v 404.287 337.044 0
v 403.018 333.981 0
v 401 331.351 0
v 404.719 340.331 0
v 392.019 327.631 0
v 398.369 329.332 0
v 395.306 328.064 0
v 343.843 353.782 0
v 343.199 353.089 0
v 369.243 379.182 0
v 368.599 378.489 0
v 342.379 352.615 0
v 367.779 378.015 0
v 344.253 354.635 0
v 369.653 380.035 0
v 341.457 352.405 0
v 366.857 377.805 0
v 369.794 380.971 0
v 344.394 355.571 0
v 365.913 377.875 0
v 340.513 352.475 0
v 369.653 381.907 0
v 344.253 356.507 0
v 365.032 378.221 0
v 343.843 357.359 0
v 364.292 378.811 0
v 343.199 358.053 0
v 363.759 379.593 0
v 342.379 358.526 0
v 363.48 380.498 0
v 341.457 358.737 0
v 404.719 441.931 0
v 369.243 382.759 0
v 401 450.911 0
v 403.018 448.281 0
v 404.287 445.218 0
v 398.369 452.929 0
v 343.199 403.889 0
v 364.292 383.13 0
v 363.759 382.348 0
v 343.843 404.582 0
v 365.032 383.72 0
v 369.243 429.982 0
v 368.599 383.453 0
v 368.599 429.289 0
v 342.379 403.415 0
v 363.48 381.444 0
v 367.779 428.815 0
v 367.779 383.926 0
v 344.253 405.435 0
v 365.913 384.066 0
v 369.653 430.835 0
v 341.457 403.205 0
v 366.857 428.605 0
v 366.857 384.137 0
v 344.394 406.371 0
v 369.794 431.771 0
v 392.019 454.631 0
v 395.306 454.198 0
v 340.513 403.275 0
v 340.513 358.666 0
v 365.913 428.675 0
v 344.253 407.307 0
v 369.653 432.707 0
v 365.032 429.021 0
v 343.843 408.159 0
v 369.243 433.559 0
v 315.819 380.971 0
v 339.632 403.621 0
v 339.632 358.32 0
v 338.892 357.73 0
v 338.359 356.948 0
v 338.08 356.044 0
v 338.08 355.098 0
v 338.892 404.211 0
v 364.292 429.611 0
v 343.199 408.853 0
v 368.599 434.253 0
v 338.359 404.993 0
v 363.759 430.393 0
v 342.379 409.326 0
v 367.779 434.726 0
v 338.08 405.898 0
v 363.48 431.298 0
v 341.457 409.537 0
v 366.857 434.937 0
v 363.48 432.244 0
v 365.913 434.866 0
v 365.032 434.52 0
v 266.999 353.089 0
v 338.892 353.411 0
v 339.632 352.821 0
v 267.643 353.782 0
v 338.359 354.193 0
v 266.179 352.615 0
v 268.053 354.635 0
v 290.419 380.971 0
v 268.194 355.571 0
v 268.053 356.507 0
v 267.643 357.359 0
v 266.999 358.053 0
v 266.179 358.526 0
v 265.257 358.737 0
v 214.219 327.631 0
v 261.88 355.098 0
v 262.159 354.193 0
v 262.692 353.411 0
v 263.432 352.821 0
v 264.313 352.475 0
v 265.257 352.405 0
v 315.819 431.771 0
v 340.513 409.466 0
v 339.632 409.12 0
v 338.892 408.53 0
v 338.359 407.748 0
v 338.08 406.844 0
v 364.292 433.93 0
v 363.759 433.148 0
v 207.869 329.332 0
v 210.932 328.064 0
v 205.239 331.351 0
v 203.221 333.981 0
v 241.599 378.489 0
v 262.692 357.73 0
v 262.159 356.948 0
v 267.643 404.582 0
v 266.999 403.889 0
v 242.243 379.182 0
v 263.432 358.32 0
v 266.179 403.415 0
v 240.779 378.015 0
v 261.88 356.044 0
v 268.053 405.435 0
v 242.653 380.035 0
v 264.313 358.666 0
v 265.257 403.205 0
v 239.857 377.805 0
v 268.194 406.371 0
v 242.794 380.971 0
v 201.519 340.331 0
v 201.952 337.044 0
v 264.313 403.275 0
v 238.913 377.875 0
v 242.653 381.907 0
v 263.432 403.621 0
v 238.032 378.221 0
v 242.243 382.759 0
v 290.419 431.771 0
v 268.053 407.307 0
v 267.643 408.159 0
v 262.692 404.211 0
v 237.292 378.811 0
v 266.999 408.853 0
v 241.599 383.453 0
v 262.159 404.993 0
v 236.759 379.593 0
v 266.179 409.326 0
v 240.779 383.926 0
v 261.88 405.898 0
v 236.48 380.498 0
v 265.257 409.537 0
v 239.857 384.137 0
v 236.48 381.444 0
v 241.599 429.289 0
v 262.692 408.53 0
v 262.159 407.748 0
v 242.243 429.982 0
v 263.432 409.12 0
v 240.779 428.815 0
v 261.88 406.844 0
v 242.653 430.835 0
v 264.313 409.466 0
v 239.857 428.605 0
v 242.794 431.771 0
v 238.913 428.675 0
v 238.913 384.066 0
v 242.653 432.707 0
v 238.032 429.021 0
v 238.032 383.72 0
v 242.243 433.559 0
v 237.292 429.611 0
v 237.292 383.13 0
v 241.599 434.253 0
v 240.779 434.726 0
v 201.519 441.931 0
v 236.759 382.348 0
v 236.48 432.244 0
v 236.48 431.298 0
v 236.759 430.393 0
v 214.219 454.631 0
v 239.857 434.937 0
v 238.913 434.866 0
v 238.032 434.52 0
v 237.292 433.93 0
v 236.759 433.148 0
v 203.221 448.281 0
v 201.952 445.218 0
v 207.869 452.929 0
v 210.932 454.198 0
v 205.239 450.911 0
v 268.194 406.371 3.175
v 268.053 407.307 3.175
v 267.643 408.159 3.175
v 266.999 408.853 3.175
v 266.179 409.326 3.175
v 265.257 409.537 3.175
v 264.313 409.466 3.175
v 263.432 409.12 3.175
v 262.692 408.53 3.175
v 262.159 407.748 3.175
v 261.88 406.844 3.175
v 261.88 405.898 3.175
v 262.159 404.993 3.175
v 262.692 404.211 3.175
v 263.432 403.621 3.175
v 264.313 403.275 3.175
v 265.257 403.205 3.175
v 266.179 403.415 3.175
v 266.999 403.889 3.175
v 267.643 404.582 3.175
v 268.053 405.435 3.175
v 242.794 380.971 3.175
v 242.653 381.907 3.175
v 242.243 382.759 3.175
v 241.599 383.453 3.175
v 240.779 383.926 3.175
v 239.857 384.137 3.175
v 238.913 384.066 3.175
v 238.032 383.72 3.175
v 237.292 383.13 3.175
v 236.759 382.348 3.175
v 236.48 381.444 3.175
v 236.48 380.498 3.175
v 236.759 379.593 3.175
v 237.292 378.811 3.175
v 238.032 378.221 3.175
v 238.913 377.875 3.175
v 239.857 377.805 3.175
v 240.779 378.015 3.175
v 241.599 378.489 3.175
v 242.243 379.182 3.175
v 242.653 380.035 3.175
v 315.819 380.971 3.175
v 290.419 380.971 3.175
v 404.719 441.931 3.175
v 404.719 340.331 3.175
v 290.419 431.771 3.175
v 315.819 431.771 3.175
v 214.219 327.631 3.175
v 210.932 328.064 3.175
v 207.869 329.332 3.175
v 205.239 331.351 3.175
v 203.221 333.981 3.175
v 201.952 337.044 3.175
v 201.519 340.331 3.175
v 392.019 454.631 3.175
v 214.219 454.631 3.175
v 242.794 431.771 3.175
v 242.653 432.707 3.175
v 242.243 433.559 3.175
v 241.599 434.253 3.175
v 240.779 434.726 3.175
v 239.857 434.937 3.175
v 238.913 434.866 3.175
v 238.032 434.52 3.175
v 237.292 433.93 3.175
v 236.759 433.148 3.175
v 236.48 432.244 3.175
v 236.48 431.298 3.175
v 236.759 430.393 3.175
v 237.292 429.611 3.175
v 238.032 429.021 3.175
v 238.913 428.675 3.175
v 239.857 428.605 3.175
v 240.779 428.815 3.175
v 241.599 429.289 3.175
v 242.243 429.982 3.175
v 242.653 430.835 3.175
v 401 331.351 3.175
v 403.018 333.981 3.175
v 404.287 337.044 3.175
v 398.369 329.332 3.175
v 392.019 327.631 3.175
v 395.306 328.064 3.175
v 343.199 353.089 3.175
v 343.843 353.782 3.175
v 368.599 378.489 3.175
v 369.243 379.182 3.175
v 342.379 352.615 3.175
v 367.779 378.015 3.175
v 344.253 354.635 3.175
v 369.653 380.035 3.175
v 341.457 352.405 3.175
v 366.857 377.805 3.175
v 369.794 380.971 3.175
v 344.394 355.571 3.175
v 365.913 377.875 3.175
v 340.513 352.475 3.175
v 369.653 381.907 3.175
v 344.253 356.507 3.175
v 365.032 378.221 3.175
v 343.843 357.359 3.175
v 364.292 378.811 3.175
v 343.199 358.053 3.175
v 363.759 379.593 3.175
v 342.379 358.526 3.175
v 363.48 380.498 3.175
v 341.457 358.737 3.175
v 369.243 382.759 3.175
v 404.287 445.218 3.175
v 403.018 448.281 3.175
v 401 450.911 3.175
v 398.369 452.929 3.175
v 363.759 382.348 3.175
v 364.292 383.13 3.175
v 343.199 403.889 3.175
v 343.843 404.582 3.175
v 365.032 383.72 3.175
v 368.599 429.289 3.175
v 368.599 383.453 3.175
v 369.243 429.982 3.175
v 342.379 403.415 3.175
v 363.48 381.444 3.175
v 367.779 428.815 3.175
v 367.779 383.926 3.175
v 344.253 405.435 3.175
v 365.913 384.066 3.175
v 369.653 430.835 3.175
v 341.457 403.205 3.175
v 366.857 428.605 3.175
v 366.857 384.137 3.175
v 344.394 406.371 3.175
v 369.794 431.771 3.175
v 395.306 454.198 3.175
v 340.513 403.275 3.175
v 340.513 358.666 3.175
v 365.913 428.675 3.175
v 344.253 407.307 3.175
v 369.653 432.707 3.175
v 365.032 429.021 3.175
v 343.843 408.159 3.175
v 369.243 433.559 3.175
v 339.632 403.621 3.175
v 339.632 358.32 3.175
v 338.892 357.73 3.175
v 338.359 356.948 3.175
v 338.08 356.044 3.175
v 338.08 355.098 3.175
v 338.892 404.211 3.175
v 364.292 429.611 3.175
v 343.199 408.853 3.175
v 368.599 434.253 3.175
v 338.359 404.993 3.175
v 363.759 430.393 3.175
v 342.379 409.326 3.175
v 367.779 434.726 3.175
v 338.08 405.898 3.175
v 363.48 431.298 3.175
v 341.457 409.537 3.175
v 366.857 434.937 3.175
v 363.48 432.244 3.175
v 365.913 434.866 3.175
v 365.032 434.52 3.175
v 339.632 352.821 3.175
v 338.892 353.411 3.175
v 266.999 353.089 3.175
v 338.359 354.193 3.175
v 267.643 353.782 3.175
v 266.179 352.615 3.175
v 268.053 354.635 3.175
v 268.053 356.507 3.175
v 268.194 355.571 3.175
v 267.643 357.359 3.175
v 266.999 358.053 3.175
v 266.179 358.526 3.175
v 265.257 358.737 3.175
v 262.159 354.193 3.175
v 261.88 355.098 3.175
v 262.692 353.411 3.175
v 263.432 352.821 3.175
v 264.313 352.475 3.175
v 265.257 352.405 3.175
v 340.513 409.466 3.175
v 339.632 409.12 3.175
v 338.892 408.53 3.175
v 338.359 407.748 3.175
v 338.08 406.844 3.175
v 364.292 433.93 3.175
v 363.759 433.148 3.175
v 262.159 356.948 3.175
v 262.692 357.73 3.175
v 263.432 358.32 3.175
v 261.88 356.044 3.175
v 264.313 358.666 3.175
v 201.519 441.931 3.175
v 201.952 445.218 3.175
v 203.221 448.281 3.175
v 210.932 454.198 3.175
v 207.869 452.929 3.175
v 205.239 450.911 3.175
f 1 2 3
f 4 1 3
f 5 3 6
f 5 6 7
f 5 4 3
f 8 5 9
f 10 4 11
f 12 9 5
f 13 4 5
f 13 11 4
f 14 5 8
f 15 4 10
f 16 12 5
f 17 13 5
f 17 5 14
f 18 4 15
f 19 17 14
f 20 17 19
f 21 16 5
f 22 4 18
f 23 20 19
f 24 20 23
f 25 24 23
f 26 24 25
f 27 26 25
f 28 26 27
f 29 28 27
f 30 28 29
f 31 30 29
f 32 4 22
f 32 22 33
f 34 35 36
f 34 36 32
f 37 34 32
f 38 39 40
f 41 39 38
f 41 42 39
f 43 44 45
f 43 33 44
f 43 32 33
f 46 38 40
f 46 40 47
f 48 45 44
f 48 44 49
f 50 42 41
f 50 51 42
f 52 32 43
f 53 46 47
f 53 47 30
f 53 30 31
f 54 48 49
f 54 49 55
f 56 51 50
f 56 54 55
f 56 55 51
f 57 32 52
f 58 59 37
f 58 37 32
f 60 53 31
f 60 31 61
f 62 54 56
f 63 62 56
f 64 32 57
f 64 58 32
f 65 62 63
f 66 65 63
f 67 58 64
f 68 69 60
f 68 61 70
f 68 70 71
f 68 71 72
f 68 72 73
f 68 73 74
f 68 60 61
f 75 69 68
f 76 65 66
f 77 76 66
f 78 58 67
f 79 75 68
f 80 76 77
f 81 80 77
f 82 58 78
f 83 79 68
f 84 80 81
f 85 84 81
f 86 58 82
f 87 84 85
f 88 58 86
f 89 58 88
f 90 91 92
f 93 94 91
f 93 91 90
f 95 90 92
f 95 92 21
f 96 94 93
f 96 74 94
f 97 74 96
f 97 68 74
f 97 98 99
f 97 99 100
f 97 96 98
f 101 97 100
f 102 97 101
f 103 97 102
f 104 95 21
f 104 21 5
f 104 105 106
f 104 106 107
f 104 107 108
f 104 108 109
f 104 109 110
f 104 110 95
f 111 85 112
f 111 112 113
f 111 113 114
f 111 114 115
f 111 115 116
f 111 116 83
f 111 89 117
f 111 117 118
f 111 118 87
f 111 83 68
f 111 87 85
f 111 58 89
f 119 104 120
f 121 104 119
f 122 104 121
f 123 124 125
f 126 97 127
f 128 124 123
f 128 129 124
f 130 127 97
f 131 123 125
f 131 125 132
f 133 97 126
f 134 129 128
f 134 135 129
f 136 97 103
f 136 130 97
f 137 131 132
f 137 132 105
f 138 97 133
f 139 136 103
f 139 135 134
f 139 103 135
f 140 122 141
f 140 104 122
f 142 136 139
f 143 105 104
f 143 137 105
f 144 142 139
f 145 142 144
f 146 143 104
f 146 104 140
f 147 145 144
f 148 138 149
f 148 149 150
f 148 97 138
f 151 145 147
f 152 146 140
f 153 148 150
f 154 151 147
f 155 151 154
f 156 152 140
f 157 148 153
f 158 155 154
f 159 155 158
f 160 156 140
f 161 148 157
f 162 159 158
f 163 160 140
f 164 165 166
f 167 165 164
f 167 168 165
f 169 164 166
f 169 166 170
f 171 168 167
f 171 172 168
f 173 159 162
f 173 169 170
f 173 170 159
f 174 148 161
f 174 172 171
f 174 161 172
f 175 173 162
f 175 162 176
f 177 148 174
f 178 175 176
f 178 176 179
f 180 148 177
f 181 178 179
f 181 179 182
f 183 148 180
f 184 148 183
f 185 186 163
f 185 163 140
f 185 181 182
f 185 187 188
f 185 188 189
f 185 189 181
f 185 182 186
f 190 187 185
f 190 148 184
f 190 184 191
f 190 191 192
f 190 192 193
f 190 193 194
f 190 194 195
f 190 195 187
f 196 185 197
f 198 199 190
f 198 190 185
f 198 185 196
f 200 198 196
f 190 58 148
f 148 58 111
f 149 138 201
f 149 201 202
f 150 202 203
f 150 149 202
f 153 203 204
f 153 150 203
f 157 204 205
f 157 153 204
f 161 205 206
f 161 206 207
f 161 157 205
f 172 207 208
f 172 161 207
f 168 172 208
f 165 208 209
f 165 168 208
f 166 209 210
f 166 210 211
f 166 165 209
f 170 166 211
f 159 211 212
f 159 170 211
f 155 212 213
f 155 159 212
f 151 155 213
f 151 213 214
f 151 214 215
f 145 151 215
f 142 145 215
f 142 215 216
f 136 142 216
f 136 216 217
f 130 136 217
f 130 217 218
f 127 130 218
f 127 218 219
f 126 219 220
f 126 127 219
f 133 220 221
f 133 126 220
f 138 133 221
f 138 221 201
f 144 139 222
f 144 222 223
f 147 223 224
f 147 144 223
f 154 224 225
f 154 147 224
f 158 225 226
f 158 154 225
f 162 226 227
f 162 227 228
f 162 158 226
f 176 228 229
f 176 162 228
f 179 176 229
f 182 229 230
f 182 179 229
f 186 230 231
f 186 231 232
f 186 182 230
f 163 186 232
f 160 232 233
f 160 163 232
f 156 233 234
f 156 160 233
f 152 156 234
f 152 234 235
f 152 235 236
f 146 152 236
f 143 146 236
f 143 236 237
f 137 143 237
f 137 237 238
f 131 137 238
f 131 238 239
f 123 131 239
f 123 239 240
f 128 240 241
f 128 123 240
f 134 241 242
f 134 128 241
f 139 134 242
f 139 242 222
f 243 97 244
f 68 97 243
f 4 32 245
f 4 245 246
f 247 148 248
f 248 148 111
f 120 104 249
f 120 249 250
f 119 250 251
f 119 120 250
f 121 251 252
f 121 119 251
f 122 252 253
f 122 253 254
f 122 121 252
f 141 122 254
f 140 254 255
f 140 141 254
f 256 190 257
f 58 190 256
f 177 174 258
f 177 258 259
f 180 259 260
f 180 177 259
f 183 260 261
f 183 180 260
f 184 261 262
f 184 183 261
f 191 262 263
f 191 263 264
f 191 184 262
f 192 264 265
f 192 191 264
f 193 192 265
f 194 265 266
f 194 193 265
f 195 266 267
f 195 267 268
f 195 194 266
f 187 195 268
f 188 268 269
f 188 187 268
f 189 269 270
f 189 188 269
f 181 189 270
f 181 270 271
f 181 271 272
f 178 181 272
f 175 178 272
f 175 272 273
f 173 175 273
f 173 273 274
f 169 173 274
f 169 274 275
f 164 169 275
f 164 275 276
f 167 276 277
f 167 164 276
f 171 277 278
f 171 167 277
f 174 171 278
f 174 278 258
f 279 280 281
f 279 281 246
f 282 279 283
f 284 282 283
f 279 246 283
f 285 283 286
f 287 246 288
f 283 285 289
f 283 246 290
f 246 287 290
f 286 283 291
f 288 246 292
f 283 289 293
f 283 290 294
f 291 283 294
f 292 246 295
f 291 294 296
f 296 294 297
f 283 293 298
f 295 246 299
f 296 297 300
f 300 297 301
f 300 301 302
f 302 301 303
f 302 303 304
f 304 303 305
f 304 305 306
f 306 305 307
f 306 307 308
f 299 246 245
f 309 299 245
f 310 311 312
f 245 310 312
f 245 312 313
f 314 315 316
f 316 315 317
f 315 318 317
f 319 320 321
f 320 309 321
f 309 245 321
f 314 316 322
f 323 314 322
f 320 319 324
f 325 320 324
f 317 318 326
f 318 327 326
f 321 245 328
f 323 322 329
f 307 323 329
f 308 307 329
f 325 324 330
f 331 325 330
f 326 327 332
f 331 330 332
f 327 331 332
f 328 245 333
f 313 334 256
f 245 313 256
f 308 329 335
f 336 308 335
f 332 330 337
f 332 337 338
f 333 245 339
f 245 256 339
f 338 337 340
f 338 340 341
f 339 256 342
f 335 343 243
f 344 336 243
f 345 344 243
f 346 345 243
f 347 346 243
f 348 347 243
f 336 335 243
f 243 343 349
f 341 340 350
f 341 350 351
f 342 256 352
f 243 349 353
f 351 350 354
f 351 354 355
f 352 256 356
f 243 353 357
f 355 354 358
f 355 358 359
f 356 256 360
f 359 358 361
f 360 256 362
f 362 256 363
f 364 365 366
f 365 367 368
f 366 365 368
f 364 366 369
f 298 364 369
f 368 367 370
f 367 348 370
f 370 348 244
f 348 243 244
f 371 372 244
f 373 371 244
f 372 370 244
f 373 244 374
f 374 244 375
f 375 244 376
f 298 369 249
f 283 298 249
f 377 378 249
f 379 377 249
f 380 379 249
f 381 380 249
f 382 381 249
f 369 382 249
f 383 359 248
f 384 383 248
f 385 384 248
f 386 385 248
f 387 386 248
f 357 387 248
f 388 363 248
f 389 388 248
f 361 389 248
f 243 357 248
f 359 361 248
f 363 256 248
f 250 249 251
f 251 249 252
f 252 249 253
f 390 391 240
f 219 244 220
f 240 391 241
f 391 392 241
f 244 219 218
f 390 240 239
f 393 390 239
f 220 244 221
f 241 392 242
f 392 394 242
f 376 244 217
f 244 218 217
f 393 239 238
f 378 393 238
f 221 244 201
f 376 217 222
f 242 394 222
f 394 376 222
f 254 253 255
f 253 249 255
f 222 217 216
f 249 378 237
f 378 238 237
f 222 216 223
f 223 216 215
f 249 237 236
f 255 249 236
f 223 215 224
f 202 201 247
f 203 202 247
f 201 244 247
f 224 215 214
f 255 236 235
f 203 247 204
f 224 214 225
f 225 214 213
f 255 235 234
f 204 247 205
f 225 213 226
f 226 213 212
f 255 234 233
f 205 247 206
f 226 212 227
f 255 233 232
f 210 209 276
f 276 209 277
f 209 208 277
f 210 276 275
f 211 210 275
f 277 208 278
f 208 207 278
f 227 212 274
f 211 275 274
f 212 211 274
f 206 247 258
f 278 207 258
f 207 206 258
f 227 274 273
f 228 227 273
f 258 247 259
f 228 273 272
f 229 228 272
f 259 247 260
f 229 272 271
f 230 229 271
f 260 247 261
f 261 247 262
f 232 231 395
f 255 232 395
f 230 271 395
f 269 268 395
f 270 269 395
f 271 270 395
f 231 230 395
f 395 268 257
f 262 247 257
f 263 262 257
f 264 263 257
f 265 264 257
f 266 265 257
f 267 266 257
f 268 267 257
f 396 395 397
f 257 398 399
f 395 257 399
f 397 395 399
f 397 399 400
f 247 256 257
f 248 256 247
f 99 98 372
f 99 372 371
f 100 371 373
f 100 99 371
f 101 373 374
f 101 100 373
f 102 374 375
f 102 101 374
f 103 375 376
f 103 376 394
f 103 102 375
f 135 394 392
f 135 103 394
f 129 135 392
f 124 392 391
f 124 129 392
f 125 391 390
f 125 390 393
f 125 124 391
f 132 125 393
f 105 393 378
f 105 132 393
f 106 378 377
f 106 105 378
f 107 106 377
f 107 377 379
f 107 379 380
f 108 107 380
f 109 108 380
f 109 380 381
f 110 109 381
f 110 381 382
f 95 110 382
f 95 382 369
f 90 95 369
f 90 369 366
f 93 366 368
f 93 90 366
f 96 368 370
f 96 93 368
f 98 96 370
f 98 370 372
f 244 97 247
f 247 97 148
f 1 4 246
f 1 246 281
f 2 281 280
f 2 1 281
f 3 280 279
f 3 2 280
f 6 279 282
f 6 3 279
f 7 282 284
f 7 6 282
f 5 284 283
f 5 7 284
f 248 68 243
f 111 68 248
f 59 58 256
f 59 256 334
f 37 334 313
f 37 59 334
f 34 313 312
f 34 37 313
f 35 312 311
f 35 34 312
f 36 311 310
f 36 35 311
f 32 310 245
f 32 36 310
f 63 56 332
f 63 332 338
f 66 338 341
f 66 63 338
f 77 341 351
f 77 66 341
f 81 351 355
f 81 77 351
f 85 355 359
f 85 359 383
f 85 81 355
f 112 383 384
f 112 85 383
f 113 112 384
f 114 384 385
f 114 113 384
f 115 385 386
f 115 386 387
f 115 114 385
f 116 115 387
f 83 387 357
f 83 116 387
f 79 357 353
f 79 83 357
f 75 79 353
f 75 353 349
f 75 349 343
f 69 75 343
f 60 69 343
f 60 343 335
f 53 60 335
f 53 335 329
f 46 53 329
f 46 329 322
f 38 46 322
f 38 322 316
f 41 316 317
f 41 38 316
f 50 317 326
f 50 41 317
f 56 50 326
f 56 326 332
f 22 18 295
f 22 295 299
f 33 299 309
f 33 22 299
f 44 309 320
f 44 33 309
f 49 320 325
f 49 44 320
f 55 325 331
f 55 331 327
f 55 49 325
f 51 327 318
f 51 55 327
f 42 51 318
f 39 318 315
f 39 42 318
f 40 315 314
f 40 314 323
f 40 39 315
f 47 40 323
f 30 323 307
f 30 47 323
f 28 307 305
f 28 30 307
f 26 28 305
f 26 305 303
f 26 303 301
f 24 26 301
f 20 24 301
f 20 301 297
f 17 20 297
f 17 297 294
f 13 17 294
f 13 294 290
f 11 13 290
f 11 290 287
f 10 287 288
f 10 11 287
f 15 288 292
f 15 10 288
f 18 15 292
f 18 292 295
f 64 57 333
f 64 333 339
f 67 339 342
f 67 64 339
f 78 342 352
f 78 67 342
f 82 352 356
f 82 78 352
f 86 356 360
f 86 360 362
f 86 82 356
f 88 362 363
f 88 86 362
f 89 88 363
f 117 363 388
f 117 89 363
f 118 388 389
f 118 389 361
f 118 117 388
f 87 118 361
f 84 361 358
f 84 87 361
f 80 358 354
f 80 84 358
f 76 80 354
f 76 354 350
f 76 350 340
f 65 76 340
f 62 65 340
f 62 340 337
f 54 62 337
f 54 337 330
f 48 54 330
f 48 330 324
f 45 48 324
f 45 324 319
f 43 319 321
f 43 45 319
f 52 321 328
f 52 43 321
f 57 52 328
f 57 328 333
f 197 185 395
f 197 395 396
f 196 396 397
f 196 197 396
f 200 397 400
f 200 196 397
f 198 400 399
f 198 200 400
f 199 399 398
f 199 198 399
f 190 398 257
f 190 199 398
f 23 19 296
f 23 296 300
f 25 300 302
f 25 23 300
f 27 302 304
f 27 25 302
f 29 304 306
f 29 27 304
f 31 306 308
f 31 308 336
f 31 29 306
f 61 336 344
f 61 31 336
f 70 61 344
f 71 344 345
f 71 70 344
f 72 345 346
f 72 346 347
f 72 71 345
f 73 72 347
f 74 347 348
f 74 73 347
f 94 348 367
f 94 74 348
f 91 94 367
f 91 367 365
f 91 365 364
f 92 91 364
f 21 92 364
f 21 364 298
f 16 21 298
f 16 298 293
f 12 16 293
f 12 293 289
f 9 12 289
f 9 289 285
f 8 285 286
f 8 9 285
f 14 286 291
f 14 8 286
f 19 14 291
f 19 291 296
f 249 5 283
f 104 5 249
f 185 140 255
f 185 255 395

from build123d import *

# Parameters (mm, degrees)
SKETCH1_R           = 3.175
SKETCH1_W           = 25.4
SKETCH1_H           = 50.8
BOSS_EXTRUDE1_DEPTH = 3.175


with BuildPart() as part:
    # Sketch1 → Boss-Extrude1 (new body)
    with BuildSketch(Plane.XY):
        with BuildLine():
            Line((214.219369126, 454.630831078), (392.019369126, 454.630831078))
            ThreePointArc((392.019369126, 454.630831078), (400.999625247, 450.911087199), (404.719369126, 441.930831078))
            Line((404.719369126, 441.930831078), (404.719369126, 340.330831078))
            ThreePointArc((404.719369126, 340.330831078), (400.999625247, 331.350574957), (392.019369126, 327.630831078))
            Line((392.019369126, 327.630831078), (214.219369126, 327.630831078))
            ThreePointArc((214.219369126, 327.630831078), (205.239113005, 331.350574957), (201.519369126, 340.330831078))
            Line((201.519369126, 340.330831078), (201.519369126, 441.930831078))
            ThreePointArc((201.519369126, 441.930831078), (205.239113005, 450.911087199), (214.219369126, 454.630831078))
        make_face()
        with Locations((265.019369126, 406.370831078)):
            Circle(SKETCH1_R, mode=Mode.SUBTRACT)
        with Locations((239.619369126, 431.770831078)):
            Circle(SKETCH1_R, mode=Mode.SUBTRACT)
        with Locations((239.619369126, 380.970831078)):
            Circle(SKETCH1_R, mode=Mode.SUBTRACT)
        with Locations((366.619369126, 380.970831078)):
            Circle(SKETCH1_R, mode=Mode.SUBTRACT)
        with Locations((341.219369126, 406.370831078)):
            Circle(SKETCH1_R, mode=Mode.SUBTRACT)
        with Locations((366.619369126, 431.770831078)):
            Circle(SKETCH1_R, mode=Mode.SUBTRACT)
        with Locations((265.019369126, 355.570831078)):
            Circle(SKETCH1_R, mode=Mode.SUBTRACT)
        with Locations((341.219369126, 355.570831078)):
            Circle(SKETCH1_R, mode=Mode.SUBTRACT)
        with Locations((303.119369126, 406.370831078)):
            Rectangle(SKETCH1_W, SKETCH1_H, mode=Mode.SUBTRACT)
    extrude(amount=BOSS_EXTRUDE1_DEPTH)


solid = part.part
